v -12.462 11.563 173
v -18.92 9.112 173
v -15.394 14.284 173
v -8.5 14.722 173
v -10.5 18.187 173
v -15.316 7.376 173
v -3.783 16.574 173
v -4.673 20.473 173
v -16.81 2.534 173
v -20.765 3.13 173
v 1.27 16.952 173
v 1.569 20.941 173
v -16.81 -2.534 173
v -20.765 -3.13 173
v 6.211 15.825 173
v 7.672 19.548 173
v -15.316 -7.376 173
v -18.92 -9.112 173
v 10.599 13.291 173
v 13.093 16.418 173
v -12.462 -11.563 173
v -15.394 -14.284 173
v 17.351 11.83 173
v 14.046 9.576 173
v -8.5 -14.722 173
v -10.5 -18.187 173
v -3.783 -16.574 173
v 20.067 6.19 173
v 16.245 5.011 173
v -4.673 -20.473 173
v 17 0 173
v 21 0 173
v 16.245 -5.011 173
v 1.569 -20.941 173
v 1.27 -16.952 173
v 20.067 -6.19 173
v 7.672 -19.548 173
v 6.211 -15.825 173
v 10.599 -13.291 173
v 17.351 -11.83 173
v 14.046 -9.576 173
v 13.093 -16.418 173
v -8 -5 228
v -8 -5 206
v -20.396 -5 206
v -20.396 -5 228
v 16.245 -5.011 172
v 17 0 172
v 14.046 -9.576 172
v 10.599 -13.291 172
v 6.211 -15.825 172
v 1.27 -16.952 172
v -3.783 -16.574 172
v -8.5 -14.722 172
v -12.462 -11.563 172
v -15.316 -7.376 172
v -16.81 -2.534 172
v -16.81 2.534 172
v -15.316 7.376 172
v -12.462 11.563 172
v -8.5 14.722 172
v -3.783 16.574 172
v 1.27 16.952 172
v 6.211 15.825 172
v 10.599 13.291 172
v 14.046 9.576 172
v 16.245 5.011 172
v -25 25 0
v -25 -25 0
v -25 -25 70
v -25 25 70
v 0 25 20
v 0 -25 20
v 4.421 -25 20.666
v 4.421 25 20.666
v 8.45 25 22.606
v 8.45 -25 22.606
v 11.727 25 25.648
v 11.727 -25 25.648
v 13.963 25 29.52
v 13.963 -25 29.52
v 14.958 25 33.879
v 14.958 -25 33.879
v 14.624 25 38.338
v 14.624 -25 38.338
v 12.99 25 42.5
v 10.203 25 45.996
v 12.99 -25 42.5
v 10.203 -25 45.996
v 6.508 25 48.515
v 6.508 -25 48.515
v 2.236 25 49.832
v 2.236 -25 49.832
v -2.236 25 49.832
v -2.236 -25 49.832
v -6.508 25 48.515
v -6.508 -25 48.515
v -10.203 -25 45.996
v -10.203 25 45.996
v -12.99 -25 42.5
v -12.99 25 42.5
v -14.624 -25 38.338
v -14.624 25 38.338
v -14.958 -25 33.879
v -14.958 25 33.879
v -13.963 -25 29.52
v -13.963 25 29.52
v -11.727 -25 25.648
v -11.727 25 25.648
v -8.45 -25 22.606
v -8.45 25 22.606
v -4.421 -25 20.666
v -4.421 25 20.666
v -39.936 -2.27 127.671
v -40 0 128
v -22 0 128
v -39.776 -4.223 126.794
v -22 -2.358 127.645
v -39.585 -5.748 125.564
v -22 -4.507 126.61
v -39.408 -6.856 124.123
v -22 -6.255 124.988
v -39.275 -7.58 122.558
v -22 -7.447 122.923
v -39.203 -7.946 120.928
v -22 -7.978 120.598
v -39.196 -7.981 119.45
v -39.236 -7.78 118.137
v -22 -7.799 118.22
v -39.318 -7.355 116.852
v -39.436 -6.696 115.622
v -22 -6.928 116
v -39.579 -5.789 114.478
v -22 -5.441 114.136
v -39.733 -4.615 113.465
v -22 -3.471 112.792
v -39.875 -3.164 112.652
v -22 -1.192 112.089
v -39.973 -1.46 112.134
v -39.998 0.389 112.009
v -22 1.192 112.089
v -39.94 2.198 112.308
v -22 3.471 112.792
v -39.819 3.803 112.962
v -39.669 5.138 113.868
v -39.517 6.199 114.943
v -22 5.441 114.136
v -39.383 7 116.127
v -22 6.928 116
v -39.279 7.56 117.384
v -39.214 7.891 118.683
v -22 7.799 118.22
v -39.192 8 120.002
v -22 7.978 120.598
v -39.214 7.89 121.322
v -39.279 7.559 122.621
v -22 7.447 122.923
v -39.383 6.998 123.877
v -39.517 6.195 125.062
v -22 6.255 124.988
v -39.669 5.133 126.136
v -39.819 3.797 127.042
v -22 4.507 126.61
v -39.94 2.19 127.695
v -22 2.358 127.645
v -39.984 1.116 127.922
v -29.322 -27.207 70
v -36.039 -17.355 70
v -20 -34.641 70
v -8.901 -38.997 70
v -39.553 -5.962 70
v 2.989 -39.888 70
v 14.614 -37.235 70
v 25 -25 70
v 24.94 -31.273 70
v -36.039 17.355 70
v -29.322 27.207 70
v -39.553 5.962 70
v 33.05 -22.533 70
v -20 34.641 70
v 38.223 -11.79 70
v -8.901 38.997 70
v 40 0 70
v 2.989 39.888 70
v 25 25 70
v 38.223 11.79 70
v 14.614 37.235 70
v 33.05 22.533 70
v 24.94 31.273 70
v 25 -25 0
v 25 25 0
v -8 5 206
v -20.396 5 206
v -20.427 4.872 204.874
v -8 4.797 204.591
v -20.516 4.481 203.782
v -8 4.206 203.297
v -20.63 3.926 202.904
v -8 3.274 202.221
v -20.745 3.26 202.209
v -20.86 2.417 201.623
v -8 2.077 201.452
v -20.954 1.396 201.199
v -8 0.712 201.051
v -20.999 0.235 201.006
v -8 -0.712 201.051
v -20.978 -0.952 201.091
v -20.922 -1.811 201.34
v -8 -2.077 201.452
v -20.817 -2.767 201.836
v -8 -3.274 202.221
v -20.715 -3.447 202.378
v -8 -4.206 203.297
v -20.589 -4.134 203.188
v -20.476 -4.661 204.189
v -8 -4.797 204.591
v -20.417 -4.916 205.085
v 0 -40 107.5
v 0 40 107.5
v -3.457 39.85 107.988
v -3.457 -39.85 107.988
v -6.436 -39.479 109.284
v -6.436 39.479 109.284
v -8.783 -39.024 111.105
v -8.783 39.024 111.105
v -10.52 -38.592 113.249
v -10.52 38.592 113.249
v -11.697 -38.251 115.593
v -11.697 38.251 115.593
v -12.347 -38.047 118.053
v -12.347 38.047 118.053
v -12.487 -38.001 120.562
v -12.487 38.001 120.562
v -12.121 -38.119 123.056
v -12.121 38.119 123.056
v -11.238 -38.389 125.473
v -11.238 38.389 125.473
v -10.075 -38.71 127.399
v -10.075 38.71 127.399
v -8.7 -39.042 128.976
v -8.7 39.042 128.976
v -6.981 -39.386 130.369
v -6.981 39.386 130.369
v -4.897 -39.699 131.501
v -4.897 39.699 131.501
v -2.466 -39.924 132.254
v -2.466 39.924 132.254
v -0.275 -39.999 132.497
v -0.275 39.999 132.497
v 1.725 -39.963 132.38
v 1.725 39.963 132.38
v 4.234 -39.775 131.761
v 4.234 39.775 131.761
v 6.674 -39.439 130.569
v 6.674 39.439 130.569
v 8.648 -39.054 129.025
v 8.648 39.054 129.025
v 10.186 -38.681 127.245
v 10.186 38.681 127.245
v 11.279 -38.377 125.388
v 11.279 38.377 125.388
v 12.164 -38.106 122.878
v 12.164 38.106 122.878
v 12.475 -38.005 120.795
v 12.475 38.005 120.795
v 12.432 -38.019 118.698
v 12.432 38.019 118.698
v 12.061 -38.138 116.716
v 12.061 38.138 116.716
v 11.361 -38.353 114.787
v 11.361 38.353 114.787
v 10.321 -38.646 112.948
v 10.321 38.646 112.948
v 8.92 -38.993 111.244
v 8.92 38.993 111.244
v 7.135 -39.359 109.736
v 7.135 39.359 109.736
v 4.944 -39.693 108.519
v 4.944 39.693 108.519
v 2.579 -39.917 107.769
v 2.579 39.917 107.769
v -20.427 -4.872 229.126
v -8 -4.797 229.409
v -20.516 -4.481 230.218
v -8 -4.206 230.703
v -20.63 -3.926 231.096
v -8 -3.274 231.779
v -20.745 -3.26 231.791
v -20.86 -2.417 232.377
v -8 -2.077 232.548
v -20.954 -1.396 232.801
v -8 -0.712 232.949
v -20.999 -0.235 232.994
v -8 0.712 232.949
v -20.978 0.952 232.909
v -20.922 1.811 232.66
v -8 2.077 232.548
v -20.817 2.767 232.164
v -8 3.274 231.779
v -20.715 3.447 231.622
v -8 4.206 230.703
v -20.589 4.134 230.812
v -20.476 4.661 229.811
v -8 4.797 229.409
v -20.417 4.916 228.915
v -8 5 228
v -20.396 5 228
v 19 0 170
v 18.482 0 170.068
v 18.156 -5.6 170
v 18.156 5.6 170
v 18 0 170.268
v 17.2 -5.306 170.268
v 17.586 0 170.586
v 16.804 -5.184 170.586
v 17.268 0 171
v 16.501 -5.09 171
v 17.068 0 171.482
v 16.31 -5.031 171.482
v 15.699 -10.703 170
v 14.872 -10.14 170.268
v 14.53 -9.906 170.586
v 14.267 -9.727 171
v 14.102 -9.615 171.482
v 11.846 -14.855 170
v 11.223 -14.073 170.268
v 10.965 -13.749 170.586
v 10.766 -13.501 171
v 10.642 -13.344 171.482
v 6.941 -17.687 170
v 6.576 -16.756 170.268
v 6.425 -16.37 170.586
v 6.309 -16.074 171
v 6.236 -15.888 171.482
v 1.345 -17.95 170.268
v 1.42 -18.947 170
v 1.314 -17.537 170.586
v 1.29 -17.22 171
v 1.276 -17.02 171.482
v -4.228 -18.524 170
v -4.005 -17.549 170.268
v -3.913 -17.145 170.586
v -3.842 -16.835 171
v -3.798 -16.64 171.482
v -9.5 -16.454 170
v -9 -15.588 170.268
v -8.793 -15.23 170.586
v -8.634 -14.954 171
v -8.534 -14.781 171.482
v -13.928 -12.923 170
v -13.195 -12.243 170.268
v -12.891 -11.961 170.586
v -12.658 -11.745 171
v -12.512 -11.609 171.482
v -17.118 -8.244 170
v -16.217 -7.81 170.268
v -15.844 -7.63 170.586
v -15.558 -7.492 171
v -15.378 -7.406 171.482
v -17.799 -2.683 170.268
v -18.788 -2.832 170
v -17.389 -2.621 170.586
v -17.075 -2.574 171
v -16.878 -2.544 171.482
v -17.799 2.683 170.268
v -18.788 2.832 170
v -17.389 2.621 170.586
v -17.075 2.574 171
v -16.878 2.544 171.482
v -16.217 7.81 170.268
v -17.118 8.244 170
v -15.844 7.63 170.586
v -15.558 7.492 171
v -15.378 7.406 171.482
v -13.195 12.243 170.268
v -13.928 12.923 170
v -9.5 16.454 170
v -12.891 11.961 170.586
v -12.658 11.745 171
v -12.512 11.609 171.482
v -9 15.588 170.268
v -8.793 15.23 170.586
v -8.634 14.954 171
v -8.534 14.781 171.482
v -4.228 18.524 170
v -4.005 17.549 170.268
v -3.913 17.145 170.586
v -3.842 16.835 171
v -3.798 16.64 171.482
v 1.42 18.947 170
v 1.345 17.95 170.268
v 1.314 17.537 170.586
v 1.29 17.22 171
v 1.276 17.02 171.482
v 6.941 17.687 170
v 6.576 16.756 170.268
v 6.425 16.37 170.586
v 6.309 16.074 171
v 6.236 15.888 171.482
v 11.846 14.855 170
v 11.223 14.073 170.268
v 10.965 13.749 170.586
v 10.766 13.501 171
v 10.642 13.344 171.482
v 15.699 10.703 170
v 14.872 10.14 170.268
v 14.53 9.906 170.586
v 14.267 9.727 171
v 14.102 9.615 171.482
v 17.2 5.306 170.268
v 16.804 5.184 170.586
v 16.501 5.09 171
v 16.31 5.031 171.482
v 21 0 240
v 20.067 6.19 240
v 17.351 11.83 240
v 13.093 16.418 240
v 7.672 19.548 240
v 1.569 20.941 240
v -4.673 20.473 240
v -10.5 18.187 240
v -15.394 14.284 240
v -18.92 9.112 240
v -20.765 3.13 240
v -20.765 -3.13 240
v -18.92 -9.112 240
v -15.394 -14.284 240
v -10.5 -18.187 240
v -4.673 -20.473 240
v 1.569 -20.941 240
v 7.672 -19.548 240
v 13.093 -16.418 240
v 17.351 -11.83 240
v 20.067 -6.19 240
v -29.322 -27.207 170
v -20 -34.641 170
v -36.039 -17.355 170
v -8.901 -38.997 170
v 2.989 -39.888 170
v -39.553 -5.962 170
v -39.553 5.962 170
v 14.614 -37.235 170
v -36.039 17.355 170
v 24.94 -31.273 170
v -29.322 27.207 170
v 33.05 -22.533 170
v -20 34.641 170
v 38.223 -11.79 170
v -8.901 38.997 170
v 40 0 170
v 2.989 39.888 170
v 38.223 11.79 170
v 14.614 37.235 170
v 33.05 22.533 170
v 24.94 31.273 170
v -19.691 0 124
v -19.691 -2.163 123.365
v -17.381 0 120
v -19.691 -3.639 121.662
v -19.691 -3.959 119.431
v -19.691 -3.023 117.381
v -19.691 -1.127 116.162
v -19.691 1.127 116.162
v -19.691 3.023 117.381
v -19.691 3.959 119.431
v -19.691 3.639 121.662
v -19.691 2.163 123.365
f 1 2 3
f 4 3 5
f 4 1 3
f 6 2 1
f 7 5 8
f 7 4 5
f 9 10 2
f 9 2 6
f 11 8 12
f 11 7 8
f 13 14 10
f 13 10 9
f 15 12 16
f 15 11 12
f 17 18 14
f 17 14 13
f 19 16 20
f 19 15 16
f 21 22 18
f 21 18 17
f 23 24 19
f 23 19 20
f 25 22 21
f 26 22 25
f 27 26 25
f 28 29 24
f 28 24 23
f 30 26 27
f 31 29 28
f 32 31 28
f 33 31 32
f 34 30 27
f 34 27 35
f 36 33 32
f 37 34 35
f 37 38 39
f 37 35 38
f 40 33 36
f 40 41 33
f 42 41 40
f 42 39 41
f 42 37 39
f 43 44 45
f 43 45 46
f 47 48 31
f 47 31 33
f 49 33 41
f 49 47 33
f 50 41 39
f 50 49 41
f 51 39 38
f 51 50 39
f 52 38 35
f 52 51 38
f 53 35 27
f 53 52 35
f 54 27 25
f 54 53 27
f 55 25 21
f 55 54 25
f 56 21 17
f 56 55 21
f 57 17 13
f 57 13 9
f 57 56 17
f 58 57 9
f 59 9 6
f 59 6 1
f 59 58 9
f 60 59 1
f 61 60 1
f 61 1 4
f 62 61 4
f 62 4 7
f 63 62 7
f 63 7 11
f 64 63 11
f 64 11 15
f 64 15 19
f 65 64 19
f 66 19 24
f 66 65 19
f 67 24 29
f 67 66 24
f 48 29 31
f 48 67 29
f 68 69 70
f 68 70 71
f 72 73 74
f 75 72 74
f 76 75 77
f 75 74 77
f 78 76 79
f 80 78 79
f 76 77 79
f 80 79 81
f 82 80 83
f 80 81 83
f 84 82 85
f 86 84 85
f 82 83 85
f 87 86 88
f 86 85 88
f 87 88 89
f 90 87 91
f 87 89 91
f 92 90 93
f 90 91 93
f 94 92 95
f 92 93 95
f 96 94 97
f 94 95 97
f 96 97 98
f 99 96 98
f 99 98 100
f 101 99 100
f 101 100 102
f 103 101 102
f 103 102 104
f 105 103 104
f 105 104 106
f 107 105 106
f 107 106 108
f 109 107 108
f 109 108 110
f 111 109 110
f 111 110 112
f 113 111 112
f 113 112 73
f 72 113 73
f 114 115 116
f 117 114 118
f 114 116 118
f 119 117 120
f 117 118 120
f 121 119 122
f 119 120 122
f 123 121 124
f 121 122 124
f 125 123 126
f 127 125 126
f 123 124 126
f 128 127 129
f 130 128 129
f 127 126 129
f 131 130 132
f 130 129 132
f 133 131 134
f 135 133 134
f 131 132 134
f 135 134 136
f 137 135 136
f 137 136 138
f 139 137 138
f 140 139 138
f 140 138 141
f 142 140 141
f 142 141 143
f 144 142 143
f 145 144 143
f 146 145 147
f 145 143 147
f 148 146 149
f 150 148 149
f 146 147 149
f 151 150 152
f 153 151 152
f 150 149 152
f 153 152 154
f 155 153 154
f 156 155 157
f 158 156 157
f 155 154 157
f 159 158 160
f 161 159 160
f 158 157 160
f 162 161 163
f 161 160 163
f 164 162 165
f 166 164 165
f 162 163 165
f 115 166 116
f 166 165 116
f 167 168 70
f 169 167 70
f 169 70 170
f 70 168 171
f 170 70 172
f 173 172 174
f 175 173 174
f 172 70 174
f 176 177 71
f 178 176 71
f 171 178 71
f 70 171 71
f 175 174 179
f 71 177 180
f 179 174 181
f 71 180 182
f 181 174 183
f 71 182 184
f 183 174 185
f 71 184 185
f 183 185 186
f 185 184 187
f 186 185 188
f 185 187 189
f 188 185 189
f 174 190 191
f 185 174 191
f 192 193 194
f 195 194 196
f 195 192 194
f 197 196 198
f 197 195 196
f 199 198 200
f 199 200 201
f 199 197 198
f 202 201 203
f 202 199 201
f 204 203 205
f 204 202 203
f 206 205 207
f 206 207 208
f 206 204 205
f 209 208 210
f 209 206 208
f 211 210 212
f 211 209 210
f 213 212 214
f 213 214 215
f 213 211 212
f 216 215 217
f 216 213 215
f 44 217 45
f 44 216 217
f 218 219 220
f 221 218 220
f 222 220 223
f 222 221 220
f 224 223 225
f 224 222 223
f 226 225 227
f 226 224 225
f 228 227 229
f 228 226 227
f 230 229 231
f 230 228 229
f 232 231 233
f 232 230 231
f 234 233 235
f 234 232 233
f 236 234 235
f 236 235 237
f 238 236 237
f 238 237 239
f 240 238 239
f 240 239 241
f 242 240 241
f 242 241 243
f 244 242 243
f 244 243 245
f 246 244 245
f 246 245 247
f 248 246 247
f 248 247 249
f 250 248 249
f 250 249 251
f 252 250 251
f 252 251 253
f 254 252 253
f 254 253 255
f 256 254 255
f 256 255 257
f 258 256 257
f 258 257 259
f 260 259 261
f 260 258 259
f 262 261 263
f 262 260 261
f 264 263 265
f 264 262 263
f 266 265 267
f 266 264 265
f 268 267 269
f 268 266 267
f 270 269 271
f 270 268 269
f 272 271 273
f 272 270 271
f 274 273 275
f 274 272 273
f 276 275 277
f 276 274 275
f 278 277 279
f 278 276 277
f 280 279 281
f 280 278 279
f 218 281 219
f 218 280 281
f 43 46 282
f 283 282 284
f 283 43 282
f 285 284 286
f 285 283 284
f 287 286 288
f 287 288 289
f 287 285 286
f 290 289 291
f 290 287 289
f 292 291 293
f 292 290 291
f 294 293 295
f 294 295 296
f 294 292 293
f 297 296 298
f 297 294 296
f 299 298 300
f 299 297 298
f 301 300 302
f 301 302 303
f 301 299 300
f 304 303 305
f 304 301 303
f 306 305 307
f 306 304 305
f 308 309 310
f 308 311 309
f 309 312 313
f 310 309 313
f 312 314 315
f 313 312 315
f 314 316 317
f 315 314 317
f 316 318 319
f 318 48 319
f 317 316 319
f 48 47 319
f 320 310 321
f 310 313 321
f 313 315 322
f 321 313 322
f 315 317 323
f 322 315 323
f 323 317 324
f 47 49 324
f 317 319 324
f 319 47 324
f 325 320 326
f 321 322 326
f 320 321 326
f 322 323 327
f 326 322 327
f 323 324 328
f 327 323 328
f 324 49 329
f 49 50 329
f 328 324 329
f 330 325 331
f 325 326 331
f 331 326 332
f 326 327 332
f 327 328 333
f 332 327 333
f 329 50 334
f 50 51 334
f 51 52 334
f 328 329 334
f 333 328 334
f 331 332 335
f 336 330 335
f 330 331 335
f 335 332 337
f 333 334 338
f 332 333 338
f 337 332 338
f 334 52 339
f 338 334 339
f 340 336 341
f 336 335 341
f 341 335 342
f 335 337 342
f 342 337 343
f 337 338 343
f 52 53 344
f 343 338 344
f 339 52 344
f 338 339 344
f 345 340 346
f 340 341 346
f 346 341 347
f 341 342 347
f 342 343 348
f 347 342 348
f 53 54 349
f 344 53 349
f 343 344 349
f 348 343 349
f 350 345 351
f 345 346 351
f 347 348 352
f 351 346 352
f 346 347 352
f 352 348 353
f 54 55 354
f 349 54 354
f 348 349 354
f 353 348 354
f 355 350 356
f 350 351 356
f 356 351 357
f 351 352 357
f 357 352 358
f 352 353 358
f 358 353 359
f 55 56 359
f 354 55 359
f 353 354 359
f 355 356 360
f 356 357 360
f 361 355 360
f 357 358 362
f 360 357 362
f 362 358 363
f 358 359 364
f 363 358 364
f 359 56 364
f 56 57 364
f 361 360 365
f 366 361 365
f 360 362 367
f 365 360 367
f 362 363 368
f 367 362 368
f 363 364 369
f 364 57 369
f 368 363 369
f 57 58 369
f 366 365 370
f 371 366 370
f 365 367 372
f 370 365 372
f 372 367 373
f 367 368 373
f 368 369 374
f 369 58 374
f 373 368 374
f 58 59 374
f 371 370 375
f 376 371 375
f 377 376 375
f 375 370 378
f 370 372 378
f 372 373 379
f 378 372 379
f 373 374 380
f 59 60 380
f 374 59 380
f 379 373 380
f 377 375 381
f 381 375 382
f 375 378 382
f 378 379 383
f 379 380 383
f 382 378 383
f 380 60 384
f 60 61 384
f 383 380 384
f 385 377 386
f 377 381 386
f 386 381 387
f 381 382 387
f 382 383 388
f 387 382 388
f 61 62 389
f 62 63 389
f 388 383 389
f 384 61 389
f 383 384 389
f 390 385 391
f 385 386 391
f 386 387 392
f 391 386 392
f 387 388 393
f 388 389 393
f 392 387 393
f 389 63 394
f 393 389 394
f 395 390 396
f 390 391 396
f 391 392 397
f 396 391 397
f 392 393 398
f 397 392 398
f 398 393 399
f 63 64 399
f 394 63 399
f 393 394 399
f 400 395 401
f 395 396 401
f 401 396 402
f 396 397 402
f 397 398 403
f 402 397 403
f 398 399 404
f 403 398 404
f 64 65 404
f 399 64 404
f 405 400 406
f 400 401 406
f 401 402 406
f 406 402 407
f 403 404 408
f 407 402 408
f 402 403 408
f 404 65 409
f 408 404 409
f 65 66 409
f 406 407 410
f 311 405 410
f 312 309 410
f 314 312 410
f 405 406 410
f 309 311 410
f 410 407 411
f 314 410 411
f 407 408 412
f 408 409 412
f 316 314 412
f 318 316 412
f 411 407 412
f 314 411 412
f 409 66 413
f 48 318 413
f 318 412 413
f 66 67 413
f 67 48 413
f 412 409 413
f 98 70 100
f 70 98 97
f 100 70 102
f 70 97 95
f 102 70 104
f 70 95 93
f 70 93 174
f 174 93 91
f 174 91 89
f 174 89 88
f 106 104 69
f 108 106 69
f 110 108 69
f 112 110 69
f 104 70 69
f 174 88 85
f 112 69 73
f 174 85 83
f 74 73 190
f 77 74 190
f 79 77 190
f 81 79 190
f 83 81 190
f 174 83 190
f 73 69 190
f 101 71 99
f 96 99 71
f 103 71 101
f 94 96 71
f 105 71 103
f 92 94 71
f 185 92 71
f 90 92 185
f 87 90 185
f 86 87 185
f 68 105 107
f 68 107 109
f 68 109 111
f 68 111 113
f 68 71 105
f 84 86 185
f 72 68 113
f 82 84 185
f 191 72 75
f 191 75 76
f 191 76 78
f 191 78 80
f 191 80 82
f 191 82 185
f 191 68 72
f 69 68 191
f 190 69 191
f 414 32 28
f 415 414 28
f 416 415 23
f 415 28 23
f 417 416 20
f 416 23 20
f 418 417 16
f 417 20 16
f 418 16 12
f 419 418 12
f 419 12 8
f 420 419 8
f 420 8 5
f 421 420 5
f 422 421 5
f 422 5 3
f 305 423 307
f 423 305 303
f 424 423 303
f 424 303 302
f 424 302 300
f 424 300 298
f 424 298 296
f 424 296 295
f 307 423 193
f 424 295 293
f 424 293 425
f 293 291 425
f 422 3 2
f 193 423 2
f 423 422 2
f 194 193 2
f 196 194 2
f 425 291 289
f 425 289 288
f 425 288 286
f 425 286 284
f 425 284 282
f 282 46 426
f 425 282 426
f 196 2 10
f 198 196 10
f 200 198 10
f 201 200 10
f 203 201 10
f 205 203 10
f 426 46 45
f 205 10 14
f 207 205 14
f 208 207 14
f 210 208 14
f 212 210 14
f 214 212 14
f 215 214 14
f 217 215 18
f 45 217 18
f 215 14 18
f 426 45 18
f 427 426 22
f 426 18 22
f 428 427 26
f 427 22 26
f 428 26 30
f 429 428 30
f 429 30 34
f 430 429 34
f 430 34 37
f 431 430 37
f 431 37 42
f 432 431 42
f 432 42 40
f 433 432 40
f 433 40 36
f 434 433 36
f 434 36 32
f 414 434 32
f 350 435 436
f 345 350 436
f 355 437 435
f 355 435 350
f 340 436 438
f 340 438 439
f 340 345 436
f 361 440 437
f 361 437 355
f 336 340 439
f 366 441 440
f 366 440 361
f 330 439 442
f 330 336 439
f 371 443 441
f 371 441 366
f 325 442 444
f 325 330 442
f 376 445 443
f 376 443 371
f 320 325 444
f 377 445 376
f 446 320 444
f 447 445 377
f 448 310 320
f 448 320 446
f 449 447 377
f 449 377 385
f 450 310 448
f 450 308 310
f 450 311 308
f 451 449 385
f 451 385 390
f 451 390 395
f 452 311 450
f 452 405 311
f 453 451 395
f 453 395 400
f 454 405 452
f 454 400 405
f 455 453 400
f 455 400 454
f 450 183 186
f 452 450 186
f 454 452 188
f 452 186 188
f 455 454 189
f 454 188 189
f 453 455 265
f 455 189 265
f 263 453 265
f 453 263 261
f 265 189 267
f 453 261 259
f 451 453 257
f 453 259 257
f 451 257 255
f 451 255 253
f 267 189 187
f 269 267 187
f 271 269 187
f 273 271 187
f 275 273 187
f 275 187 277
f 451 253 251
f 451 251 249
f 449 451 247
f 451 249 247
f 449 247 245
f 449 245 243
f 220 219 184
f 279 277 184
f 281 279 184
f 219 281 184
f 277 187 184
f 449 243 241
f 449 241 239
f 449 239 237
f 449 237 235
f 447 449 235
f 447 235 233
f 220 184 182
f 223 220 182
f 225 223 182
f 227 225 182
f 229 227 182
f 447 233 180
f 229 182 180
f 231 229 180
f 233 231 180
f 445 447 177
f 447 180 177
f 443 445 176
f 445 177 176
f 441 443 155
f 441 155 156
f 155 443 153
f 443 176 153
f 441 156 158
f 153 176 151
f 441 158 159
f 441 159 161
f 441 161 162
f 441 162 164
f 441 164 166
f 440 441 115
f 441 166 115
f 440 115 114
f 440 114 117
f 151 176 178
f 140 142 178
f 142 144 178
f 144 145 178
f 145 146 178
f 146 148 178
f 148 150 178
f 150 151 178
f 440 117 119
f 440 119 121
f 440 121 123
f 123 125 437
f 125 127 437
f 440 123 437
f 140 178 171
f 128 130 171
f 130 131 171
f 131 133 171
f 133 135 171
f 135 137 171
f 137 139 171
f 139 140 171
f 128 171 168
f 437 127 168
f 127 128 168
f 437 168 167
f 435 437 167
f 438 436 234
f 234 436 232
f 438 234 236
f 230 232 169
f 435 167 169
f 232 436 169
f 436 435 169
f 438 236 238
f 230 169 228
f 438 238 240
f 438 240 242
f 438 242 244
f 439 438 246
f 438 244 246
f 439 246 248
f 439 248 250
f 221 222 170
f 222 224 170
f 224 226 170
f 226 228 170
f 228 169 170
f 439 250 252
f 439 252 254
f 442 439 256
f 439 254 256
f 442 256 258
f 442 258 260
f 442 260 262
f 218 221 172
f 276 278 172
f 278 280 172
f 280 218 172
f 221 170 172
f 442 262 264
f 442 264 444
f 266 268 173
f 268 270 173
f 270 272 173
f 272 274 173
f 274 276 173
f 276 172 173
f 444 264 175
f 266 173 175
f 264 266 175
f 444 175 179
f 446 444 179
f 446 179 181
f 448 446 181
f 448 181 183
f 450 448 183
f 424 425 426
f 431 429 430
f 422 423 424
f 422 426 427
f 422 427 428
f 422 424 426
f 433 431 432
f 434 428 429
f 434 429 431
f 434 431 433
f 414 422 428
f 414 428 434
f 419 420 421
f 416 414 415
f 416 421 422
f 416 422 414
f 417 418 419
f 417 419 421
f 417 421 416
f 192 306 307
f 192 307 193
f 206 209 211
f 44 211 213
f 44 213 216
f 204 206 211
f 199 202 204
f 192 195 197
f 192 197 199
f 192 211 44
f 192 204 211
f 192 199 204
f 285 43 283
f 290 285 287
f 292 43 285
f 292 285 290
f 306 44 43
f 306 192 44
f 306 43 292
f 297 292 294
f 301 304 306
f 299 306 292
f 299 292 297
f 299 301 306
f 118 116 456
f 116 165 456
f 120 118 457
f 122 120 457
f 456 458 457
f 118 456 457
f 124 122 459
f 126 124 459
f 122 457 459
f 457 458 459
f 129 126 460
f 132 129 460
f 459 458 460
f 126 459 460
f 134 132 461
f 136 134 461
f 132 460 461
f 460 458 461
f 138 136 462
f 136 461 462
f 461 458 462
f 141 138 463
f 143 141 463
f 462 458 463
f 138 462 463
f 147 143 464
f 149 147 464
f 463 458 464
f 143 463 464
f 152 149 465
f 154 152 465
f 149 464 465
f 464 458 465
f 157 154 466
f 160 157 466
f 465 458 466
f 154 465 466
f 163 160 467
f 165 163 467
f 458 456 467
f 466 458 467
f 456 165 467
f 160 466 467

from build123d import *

# Parameters (mm, degrees)
SKETCH_1_W               = 50
SKETCH_1_H               = 50
EXTRUDE_1_DEPTH          = 70
SKETCH_2_R               = 40
EXTRUDE_2_DEPTH          = 100
SKETCH_3_R               = 21
EXTRUDE_3_DEPTH          = 70
SKETCH_5_R               = 15
CUT_EXTRUDE_1_DEPTH      = 252.843205189
CUT_EXTRUDE_2_DEPTH      = 50
CUT_EXTRUDE_2_DEPTH_BACK = 50
SKETCH_6_R               = 12.5
CUT_EXTRUDE_START        = -8
CUT_EXTRUDE_3_DEPTH      = 239.576560151
SKETCH_10_W              = 4
SKETCH_10_H              = 3
FILLET_1_R               = 2


with BuildPart() as part:
    # Эскиз1 → Бобышка-Вытянуть1 (new body)
    with BuildSketch(Plane.XY):
        Rectangle(SKETCH_1_W, SKETCH_1_H)
    extrude(amount=EXTRUDE_1_DEPTH)

    # Эскиз2 → Бобышка-Вытянуть2 (add)
    with BuildSketch(Plane.XY.offset(70)):
        Circle(SKETCH_2_R)
    extrude(amount=EXTRUDE_2_DEPTH)

    # Эскиз3 → Бобышка-Вытянуть3 (add)
    with BuildSketch(Plane.XY.offset(170)):
        Circle(SKETCH_3_R)
    extrude(amount=EXTRUDE_3_DEPTH)

    # Эскиз5 → Вырез-Вытянуть1 (cut, through all)
    with BuildSketch(Plane.XZ.offset(25)):
        with Locations((0, 35)):
            Circle(SKETCH_5_R)
    extrude(amount=-CUT_EXTRUDE_1_DEPTH, mode=Mode.SUBTRACT)

    # Эскиз6 → Вырез-Вытянуть2 (cut, two sides: drawn at the far end of the back side and taken through both)
    with BuildSketch(Plane(origin=(0, 0, 0), x_dir=(1, 0, 0), z_dir=(0, 1, 0)).offset(-CUT_EXTRUDE_2_DEPTH_BACK)):
        with Locations((0, -120)):
            Circle(SKETCH_6_R)
    extrude(amount=CUT_EXTRUDE_2_DEPTH + CUT_EXTRUDE_2_DEPTH_BACK, mode=Mode.SUBTRACT)

    # Эскиз7 → Вырез-Повернуть1 (revolve, cut)
    with BuildSketch(Plane(origin=(0, 0, 0), x_dir=(1, 0, 0), z_dir=(0, 1, 0))):
        Polygon((-40, -120), (-40, -112), (-22, -112), (-17.381197846, -120), align=None)
    revolve(axis=Axis((-40, 0, 120), (1, 0, 0)), mode=Mode.SUBTRACT)

    # Эскиз8 → Вырез-Вытянуть3 (cut, through all)
    with BuildSketch(Plane(origin=(0, 0, 0), x_dir=(0, 0, -1), z_dir=(1, 0, 0)).offset(CUT_EXTRUDE_START)):
        with BuildLine():
            Line((-228, 5), (-206, 5))
            ThreePointArc((-206, 5), (-201, 0), (-206, -5))
            Line((-206, -5), (-228, -5))
            ThreePointArc((-228, -5), (-233, 0), (-228, 5))
        make_face()
    extrude(amount=-CUT_EXTRUDE_3_DEPTH, mode=Mode.SUBTRACT)

    # Эскиз10 → Вырез-Повернуть2 (revolve, cut)
    with BuildSketch(Plane(origin=(0, 0, 0), x_dir=(1, 0, 0), z_dir=(0, 1, 0))):
        with Locations((-19, -171.5)):
            Rectangle(SKETCH_10_W, SKETCH_10_H)
    revolve(axis=Axis((0, 0, 240), (0, 0, -1)), mode=Mode.SUBTRACT)

    # Скругление1
    fillet_1_edges = [part.edges().sort_by_distance(p)[0] for p in [
        (17, 0, 170),
    ]]
    fillet(fillet_1_edges, radius=FILLET_1_R)


solid = part.part
